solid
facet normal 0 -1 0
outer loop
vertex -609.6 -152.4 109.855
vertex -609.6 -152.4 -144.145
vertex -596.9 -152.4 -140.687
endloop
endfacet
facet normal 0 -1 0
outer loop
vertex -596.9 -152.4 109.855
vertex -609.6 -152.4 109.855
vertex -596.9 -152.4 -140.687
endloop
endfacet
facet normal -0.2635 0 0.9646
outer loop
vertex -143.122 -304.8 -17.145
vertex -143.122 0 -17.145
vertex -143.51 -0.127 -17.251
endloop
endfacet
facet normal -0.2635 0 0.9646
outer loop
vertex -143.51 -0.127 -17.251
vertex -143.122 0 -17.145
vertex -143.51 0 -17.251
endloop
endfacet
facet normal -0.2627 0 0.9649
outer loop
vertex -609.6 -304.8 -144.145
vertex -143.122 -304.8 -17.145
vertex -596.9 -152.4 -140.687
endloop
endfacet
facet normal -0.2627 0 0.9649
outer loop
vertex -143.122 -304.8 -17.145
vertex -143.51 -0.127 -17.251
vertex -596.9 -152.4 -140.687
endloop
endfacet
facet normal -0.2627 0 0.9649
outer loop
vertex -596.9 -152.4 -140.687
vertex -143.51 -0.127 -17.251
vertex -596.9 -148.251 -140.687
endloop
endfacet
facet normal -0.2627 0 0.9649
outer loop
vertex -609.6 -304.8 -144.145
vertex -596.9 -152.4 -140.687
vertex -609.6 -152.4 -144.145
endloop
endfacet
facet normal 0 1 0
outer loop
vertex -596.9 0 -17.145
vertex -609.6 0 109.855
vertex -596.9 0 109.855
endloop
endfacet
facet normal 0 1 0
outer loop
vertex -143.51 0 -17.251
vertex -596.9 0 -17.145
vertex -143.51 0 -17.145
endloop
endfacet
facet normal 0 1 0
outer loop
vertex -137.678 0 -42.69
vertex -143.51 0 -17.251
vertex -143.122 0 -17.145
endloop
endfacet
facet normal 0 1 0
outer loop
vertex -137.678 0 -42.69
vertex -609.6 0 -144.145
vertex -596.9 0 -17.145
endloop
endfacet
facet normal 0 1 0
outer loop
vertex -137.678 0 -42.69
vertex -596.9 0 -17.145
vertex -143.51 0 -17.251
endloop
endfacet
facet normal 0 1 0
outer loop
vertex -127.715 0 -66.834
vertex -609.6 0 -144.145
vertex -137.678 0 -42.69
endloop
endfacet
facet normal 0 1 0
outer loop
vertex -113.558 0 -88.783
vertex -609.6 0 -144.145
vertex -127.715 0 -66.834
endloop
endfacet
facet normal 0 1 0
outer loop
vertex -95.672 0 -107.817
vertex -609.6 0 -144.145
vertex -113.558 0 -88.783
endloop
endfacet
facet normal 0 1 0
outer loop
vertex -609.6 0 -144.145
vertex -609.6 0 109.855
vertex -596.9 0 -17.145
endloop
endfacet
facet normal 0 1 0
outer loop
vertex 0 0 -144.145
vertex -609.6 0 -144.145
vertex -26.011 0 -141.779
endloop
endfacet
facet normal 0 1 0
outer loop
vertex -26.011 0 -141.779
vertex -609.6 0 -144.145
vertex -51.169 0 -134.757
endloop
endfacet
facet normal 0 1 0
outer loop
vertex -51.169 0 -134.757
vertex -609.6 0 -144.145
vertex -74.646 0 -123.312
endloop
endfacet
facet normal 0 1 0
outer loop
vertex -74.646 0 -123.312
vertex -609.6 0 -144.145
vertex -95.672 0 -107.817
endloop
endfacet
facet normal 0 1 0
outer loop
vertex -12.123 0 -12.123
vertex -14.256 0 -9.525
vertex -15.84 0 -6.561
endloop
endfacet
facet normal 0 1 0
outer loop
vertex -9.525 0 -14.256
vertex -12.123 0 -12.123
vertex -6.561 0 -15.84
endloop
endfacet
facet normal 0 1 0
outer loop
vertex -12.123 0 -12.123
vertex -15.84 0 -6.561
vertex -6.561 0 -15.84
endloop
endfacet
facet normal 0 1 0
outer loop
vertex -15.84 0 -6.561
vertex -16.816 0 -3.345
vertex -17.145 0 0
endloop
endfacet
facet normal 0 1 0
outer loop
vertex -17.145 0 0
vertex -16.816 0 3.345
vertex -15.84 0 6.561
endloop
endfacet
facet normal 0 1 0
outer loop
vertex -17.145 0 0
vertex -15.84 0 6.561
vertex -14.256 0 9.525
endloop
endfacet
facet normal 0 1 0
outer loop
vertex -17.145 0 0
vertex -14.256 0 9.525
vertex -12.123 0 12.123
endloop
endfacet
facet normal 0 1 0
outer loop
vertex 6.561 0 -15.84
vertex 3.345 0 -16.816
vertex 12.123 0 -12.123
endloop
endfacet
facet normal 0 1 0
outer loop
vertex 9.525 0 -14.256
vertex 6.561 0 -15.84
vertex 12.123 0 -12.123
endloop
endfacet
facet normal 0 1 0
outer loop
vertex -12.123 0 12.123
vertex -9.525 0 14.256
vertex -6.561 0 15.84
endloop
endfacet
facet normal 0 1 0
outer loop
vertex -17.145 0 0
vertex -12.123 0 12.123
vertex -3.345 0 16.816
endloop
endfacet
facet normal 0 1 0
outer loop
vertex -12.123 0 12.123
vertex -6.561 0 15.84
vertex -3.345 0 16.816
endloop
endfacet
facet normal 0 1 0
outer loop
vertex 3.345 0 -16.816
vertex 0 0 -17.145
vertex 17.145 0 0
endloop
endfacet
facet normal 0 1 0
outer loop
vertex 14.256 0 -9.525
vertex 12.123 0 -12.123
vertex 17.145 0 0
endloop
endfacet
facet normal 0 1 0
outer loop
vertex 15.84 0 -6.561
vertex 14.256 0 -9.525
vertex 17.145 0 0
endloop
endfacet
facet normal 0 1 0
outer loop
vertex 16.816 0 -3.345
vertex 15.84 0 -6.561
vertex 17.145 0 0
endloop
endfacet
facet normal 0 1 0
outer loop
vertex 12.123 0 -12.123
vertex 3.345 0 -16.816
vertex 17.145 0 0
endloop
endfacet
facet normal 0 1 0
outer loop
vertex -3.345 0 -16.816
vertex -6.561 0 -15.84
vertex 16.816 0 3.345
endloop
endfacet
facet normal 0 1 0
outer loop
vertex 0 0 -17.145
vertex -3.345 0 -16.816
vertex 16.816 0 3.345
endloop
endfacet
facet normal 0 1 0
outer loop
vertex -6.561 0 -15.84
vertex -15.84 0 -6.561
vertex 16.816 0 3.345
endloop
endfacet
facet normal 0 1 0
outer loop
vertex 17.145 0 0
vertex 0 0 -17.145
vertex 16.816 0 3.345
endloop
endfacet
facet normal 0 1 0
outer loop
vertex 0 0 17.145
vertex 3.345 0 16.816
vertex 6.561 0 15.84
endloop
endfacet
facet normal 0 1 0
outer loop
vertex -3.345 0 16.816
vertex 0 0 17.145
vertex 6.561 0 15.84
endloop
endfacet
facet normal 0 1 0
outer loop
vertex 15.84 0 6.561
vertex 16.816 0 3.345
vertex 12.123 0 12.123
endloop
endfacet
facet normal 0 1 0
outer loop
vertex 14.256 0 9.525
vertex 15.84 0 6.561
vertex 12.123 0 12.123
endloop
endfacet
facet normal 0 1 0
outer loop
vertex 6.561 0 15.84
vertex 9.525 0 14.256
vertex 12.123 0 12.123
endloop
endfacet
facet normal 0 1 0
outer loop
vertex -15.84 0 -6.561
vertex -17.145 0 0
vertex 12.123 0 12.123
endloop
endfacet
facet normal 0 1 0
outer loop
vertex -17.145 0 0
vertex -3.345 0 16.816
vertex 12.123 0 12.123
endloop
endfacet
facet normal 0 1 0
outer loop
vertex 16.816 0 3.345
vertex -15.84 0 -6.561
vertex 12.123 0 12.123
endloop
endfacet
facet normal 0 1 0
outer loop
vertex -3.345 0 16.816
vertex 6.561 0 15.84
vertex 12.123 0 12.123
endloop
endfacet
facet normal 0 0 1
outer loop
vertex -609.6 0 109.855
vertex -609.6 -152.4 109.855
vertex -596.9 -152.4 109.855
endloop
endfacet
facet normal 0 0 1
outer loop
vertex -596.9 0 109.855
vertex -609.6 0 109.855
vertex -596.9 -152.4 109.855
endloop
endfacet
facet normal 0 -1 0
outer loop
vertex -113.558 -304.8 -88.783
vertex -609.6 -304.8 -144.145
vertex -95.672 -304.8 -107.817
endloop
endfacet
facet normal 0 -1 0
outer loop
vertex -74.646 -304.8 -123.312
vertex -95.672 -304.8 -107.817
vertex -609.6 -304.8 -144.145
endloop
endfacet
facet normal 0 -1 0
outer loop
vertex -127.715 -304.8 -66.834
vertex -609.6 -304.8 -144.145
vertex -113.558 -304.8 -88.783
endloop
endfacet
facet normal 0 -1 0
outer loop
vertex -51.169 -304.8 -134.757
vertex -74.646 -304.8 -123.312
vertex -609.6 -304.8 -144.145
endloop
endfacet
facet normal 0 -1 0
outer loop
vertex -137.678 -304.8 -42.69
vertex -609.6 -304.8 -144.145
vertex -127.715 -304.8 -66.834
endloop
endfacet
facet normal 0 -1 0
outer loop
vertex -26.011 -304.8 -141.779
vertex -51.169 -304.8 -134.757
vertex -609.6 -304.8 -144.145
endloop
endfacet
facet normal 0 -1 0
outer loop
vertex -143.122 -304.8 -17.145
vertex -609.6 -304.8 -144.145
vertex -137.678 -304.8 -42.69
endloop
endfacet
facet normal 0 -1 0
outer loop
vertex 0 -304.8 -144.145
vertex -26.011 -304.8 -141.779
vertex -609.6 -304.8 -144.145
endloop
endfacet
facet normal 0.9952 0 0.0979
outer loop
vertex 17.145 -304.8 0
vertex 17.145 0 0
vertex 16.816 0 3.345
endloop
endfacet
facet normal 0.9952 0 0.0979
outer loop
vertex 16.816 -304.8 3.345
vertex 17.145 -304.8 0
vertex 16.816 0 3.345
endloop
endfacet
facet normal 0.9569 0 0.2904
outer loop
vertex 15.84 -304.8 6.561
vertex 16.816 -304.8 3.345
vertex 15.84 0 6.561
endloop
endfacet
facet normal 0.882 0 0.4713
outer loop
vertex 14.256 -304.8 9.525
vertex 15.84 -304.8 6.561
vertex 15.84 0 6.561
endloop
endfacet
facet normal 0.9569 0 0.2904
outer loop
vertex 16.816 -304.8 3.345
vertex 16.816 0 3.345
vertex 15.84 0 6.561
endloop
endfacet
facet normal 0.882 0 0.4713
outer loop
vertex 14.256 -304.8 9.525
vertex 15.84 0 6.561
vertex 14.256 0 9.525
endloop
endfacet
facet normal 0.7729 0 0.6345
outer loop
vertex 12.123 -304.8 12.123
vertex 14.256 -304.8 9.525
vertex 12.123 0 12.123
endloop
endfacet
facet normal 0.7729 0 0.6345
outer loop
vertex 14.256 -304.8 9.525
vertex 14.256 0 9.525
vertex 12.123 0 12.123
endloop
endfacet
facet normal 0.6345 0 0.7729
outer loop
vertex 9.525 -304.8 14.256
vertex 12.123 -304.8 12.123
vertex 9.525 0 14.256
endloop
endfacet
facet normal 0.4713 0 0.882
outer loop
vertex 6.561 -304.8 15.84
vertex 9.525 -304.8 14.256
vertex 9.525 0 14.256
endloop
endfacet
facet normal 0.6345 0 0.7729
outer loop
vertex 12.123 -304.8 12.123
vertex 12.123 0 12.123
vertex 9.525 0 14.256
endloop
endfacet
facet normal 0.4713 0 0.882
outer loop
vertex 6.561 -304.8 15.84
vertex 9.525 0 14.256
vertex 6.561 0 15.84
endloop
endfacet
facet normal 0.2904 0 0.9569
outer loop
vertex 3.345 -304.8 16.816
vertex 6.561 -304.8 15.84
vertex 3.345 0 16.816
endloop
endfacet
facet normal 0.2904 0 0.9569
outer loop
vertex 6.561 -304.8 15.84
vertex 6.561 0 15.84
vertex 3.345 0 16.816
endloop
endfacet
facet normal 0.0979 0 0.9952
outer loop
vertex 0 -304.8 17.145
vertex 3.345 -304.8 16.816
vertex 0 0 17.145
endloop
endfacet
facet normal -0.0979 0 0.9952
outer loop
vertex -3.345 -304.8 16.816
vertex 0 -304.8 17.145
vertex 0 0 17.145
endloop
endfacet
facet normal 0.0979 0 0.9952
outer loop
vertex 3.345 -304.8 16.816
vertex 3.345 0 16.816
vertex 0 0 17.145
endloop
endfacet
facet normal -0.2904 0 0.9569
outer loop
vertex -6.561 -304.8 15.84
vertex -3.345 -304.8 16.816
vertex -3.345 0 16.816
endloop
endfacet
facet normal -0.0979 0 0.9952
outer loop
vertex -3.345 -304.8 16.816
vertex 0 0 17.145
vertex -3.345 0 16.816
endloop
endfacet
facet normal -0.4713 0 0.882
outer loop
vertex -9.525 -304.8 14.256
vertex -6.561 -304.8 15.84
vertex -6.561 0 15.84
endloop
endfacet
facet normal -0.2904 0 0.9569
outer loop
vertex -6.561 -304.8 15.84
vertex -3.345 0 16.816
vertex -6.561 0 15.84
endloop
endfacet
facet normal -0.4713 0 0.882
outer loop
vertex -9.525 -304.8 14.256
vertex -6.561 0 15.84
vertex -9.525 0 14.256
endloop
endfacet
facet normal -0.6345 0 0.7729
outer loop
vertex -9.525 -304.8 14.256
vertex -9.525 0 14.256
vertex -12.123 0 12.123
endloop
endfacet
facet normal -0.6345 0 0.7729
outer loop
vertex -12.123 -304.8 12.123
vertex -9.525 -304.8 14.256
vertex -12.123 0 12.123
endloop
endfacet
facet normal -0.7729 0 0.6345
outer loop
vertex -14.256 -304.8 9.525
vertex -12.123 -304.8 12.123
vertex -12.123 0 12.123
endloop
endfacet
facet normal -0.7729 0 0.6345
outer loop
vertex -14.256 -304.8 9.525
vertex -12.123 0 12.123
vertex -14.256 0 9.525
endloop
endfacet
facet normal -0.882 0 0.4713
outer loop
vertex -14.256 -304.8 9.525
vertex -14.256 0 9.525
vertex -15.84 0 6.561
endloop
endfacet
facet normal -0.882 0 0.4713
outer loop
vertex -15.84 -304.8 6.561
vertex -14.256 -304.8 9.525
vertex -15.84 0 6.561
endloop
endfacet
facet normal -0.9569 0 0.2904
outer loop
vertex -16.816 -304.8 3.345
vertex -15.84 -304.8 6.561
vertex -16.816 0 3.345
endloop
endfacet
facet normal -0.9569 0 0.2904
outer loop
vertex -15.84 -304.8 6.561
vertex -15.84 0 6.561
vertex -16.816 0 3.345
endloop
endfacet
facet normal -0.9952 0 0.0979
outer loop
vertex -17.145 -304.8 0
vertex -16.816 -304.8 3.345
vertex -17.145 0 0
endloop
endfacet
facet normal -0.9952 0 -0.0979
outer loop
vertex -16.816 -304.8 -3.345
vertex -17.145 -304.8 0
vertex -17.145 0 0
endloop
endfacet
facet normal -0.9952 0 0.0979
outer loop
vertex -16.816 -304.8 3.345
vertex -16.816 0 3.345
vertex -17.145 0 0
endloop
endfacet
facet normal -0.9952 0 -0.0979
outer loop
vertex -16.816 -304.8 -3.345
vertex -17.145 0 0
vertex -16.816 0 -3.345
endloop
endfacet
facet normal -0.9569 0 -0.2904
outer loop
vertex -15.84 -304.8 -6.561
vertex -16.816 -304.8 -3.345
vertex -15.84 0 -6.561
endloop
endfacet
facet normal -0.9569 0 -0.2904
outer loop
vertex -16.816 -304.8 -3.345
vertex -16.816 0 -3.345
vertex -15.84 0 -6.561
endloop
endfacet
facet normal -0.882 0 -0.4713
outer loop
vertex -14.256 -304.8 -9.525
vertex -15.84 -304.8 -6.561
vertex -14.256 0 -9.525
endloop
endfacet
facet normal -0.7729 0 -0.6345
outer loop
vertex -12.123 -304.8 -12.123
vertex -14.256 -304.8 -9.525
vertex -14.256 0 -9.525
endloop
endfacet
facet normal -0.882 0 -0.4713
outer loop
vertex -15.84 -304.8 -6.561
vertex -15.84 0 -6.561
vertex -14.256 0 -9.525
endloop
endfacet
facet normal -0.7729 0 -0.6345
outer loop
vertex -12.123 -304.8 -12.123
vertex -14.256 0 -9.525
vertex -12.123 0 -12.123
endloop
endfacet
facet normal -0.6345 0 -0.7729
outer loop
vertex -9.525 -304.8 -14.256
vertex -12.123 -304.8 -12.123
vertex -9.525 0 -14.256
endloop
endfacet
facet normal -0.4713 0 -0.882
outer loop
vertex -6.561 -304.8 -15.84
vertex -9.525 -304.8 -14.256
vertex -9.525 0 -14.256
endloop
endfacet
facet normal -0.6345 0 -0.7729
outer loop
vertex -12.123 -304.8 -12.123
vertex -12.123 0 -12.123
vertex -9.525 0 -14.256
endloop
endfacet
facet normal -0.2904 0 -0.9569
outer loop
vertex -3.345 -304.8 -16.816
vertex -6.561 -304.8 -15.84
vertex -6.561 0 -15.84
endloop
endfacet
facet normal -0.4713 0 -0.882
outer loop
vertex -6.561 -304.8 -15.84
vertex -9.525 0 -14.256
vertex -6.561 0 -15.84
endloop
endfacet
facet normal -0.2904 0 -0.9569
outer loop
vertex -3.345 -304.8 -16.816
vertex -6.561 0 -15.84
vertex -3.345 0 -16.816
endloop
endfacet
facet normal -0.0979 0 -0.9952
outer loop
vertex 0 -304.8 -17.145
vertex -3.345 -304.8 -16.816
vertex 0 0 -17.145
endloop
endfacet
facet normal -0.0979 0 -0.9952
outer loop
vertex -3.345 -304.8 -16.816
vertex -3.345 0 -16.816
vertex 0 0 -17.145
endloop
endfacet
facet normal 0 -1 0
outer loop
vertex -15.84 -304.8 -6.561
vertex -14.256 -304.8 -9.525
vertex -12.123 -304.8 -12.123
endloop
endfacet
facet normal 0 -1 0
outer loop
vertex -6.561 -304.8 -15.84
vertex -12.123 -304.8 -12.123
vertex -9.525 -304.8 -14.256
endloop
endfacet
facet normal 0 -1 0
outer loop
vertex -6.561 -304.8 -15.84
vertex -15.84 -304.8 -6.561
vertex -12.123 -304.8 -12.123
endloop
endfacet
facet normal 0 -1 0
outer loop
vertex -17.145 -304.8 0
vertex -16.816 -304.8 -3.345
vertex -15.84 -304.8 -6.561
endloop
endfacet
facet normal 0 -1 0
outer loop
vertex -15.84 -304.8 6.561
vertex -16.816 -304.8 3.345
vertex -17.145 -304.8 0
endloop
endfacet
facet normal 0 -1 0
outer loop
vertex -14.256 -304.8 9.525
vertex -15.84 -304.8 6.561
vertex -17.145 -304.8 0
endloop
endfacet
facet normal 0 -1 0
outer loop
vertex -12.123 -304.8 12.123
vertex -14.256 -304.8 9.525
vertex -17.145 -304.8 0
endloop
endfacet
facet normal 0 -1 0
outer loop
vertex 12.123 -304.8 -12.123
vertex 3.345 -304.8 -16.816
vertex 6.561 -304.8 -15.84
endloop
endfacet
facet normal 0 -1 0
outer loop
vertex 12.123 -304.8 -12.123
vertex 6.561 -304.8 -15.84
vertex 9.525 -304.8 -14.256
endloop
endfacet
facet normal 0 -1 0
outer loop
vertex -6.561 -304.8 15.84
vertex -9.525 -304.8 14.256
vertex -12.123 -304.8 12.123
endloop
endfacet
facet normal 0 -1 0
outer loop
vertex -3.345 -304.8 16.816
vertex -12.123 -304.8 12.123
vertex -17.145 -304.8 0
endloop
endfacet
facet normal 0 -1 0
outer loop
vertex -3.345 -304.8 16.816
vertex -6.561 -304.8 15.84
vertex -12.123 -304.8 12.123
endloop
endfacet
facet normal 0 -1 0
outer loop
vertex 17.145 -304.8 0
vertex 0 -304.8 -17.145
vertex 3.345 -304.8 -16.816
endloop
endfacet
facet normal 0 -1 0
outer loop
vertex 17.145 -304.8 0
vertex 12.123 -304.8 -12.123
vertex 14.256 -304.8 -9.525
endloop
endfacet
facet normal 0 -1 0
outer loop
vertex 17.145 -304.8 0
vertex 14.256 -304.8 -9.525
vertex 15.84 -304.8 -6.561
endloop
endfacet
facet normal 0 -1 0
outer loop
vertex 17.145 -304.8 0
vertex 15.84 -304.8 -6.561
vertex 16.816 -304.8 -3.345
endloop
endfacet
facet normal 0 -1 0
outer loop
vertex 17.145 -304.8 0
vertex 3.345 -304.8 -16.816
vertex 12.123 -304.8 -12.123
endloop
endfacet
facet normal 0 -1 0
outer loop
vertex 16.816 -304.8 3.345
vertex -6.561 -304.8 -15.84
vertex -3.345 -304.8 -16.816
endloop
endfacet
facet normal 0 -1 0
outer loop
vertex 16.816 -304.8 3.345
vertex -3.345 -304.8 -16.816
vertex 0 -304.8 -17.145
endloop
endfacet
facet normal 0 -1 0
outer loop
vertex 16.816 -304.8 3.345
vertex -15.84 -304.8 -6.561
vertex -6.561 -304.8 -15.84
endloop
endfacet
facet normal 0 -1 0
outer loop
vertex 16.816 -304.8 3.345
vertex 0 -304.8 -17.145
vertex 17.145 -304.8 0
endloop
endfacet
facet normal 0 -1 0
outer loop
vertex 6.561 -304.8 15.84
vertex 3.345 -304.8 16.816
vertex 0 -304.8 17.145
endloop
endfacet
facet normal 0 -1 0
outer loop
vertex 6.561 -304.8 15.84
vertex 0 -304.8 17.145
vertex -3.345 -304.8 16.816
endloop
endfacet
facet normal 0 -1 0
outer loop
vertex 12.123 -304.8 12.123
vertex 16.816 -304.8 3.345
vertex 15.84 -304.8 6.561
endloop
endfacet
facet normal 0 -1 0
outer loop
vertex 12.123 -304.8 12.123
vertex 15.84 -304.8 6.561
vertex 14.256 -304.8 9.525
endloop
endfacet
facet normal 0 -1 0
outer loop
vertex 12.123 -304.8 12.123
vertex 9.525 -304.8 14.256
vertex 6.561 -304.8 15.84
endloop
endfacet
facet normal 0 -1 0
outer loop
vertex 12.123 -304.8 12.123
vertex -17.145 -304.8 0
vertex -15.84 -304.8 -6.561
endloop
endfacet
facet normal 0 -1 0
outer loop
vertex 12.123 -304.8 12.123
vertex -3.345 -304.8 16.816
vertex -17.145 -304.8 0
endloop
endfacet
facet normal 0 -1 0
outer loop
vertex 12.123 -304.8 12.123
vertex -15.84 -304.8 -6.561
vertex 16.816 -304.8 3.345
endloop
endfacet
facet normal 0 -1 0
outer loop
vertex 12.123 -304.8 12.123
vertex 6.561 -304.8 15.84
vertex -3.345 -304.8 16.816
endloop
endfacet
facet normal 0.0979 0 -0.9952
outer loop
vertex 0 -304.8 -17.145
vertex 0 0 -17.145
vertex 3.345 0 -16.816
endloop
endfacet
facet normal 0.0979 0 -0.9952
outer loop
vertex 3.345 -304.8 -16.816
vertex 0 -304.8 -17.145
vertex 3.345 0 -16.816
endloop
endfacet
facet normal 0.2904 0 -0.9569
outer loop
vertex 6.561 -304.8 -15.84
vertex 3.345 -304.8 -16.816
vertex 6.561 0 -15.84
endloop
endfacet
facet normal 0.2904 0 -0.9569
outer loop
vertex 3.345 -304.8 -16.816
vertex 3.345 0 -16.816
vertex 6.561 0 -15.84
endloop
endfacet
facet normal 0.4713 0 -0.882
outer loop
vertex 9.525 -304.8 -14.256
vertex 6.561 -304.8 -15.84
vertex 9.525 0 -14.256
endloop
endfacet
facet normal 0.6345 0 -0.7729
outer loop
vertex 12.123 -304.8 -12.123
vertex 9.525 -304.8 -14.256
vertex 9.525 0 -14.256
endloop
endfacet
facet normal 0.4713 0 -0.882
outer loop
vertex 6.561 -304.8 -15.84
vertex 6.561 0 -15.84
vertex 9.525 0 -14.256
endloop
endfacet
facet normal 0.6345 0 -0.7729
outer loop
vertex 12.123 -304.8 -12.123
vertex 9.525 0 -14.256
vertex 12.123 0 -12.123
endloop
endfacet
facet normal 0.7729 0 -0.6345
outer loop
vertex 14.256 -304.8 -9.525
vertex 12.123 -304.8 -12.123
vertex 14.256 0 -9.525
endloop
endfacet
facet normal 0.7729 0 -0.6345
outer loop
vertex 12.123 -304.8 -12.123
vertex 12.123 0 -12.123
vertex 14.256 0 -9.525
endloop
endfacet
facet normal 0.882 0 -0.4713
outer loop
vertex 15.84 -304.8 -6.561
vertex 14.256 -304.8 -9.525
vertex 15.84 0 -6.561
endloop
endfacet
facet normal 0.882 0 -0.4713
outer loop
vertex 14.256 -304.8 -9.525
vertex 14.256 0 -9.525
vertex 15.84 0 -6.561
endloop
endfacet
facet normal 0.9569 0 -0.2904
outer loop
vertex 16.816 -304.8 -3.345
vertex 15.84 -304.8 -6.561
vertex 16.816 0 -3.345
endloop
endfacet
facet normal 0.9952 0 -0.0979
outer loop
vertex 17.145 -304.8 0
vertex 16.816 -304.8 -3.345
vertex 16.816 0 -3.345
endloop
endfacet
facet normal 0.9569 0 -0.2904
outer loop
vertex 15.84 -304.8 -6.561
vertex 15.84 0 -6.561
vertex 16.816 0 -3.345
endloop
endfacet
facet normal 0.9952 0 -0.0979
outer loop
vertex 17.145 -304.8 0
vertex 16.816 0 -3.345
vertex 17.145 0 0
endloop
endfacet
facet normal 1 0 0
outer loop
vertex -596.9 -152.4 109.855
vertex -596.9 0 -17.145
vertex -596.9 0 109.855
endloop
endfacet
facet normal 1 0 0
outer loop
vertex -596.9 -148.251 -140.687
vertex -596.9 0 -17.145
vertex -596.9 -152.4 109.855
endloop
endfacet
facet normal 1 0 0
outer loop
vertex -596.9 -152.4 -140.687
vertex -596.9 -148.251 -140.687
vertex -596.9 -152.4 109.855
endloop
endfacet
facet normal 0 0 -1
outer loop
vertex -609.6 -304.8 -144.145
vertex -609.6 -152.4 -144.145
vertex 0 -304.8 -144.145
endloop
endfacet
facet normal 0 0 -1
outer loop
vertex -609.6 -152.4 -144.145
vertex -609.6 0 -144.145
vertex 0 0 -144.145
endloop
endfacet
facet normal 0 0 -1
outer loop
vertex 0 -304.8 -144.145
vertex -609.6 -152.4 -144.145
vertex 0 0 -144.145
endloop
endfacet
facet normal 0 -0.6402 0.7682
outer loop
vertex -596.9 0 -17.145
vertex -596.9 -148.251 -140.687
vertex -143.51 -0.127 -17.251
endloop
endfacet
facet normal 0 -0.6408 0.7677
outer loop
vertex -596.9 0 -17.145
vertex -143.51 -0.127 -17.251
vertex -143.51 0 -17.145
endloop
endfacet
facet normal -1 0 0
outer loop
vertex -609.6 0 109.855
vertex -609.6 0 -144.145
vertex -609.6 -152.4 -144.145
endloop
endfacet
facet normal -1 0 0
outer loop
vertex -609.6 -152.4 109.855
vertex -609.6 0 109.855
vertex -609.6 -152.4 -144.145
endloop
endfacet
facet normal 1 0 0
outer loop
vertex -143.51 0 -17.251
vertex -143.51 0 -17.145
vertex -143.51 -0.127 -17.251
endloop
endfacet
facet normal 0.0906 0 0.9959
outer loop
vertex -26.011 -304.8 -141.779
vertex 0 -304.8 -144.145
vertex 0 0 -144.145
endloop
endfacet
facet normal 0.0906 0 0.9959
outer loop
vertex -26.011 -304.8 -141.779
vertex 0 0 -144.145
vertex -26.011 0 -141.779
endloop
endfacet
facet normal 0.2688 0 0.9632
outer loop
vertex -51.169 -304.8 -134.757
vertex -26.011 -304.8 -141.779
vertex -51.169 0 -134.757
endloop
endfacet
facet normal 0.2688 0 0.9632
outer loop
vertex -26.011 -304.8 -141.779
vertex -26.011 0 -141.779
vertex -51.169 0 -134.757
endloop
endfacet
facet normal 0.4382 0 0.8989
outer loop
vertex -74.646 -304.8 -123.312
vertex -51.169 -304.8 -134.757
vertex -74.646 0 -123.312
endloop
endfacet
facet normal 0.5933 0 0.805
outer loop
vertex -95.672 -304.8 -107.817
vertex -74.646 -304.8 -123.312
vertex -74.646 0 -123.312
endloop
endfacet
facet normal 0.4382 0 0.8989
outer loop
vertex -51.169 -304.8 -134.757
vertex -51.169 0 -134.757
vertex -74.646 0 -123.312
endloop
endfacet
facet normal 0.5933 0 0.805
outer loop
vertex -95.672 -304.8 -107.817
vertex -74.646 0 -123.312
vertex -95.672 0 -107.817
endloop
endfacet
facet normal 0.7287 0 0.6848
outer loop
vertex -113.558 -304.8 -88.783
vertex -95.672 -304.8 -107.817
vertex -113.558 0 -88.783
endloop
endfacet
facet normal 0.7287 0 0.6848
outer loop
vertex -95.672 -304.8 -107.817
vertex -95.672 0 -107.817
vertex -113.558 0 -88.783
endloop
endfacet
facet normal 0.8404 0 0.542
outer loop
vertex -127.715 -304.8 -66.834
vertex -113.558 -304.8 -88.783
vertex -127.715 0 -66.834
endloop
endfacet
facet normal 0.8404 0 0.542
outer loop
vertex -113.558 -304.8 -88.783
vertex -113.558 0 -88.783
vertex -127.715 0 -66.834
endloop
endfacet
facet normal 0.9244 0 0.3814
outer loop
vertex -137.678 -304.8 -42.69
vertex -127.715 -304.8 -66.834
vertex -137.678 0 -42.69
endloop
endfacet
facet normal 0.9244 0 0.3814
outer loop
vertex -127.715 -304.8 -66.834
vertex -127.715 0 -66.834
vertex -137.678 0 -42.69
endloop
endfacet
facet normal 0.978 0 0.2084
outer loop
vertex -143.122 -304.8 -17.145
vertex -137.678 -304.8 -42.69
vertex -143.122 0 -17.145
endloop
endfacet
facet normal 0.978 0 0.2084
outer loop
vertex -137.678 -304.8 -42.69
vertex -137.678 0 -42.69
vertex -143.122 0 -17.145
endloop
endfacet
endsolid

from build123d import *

# Parameters (mm, degrees)
F1_DEPTH = 304.8
F2_W     = 12.7
F2_H     = 152.4
F3_DEPTH = 254
F5_DEPTH = 466.09


with BuildPart() as f1:
    # F0 (on Front) → F1 (new body)
    with BuildSketch(Plane.XZ):
        with BuildLine():
            ThreePointArc((17.145, 0), (-12.123346, 12.123346), (0, -17.145))
            ThreePointArc((0, -17.145), (12.123346, -12.123346), (17.145, 0))
        make_face()
        with BuildLine():
            ThreePointArc((0, -144.145), (-95.672397, -107.817316), (-143.121731, -17.145))
            Line((-143.121731, -17.145), (-143.121731, -144.145))
            Line((-143.121731, -144.145), (0, -144.145))
        make_face()
        Polygon((-143.121731, -144.145), (-143.121731, -17.145), (-609.6, -144.145), align=None)
    extrude(amount=F1_DEPTH)

    # F2 (on face) → F3 (join)
    with BuildSketch(Plane(origin=(0, 0, -144.145), x_dir=(1, 0, 0), z_dir=(0, 0, -1))):
        with Locations((-603.25, 76.2)):
            Rectangle(F2_W, F2_H)
    extrude(amount=-F3_DEPTH)

    # F4 (on face) → F5 (join)
    with BuildSketch(Plane(origin=(-609.6, 0, 0), x_dir=(0, -1, 0), z_dir=(-1, 0, 0))):
        Polygon((152.4, -144.145), (0, -17.145), (0, -144.145), align=None)
    extrude(amount=-F5_DEPTH)


solid = f1.part
